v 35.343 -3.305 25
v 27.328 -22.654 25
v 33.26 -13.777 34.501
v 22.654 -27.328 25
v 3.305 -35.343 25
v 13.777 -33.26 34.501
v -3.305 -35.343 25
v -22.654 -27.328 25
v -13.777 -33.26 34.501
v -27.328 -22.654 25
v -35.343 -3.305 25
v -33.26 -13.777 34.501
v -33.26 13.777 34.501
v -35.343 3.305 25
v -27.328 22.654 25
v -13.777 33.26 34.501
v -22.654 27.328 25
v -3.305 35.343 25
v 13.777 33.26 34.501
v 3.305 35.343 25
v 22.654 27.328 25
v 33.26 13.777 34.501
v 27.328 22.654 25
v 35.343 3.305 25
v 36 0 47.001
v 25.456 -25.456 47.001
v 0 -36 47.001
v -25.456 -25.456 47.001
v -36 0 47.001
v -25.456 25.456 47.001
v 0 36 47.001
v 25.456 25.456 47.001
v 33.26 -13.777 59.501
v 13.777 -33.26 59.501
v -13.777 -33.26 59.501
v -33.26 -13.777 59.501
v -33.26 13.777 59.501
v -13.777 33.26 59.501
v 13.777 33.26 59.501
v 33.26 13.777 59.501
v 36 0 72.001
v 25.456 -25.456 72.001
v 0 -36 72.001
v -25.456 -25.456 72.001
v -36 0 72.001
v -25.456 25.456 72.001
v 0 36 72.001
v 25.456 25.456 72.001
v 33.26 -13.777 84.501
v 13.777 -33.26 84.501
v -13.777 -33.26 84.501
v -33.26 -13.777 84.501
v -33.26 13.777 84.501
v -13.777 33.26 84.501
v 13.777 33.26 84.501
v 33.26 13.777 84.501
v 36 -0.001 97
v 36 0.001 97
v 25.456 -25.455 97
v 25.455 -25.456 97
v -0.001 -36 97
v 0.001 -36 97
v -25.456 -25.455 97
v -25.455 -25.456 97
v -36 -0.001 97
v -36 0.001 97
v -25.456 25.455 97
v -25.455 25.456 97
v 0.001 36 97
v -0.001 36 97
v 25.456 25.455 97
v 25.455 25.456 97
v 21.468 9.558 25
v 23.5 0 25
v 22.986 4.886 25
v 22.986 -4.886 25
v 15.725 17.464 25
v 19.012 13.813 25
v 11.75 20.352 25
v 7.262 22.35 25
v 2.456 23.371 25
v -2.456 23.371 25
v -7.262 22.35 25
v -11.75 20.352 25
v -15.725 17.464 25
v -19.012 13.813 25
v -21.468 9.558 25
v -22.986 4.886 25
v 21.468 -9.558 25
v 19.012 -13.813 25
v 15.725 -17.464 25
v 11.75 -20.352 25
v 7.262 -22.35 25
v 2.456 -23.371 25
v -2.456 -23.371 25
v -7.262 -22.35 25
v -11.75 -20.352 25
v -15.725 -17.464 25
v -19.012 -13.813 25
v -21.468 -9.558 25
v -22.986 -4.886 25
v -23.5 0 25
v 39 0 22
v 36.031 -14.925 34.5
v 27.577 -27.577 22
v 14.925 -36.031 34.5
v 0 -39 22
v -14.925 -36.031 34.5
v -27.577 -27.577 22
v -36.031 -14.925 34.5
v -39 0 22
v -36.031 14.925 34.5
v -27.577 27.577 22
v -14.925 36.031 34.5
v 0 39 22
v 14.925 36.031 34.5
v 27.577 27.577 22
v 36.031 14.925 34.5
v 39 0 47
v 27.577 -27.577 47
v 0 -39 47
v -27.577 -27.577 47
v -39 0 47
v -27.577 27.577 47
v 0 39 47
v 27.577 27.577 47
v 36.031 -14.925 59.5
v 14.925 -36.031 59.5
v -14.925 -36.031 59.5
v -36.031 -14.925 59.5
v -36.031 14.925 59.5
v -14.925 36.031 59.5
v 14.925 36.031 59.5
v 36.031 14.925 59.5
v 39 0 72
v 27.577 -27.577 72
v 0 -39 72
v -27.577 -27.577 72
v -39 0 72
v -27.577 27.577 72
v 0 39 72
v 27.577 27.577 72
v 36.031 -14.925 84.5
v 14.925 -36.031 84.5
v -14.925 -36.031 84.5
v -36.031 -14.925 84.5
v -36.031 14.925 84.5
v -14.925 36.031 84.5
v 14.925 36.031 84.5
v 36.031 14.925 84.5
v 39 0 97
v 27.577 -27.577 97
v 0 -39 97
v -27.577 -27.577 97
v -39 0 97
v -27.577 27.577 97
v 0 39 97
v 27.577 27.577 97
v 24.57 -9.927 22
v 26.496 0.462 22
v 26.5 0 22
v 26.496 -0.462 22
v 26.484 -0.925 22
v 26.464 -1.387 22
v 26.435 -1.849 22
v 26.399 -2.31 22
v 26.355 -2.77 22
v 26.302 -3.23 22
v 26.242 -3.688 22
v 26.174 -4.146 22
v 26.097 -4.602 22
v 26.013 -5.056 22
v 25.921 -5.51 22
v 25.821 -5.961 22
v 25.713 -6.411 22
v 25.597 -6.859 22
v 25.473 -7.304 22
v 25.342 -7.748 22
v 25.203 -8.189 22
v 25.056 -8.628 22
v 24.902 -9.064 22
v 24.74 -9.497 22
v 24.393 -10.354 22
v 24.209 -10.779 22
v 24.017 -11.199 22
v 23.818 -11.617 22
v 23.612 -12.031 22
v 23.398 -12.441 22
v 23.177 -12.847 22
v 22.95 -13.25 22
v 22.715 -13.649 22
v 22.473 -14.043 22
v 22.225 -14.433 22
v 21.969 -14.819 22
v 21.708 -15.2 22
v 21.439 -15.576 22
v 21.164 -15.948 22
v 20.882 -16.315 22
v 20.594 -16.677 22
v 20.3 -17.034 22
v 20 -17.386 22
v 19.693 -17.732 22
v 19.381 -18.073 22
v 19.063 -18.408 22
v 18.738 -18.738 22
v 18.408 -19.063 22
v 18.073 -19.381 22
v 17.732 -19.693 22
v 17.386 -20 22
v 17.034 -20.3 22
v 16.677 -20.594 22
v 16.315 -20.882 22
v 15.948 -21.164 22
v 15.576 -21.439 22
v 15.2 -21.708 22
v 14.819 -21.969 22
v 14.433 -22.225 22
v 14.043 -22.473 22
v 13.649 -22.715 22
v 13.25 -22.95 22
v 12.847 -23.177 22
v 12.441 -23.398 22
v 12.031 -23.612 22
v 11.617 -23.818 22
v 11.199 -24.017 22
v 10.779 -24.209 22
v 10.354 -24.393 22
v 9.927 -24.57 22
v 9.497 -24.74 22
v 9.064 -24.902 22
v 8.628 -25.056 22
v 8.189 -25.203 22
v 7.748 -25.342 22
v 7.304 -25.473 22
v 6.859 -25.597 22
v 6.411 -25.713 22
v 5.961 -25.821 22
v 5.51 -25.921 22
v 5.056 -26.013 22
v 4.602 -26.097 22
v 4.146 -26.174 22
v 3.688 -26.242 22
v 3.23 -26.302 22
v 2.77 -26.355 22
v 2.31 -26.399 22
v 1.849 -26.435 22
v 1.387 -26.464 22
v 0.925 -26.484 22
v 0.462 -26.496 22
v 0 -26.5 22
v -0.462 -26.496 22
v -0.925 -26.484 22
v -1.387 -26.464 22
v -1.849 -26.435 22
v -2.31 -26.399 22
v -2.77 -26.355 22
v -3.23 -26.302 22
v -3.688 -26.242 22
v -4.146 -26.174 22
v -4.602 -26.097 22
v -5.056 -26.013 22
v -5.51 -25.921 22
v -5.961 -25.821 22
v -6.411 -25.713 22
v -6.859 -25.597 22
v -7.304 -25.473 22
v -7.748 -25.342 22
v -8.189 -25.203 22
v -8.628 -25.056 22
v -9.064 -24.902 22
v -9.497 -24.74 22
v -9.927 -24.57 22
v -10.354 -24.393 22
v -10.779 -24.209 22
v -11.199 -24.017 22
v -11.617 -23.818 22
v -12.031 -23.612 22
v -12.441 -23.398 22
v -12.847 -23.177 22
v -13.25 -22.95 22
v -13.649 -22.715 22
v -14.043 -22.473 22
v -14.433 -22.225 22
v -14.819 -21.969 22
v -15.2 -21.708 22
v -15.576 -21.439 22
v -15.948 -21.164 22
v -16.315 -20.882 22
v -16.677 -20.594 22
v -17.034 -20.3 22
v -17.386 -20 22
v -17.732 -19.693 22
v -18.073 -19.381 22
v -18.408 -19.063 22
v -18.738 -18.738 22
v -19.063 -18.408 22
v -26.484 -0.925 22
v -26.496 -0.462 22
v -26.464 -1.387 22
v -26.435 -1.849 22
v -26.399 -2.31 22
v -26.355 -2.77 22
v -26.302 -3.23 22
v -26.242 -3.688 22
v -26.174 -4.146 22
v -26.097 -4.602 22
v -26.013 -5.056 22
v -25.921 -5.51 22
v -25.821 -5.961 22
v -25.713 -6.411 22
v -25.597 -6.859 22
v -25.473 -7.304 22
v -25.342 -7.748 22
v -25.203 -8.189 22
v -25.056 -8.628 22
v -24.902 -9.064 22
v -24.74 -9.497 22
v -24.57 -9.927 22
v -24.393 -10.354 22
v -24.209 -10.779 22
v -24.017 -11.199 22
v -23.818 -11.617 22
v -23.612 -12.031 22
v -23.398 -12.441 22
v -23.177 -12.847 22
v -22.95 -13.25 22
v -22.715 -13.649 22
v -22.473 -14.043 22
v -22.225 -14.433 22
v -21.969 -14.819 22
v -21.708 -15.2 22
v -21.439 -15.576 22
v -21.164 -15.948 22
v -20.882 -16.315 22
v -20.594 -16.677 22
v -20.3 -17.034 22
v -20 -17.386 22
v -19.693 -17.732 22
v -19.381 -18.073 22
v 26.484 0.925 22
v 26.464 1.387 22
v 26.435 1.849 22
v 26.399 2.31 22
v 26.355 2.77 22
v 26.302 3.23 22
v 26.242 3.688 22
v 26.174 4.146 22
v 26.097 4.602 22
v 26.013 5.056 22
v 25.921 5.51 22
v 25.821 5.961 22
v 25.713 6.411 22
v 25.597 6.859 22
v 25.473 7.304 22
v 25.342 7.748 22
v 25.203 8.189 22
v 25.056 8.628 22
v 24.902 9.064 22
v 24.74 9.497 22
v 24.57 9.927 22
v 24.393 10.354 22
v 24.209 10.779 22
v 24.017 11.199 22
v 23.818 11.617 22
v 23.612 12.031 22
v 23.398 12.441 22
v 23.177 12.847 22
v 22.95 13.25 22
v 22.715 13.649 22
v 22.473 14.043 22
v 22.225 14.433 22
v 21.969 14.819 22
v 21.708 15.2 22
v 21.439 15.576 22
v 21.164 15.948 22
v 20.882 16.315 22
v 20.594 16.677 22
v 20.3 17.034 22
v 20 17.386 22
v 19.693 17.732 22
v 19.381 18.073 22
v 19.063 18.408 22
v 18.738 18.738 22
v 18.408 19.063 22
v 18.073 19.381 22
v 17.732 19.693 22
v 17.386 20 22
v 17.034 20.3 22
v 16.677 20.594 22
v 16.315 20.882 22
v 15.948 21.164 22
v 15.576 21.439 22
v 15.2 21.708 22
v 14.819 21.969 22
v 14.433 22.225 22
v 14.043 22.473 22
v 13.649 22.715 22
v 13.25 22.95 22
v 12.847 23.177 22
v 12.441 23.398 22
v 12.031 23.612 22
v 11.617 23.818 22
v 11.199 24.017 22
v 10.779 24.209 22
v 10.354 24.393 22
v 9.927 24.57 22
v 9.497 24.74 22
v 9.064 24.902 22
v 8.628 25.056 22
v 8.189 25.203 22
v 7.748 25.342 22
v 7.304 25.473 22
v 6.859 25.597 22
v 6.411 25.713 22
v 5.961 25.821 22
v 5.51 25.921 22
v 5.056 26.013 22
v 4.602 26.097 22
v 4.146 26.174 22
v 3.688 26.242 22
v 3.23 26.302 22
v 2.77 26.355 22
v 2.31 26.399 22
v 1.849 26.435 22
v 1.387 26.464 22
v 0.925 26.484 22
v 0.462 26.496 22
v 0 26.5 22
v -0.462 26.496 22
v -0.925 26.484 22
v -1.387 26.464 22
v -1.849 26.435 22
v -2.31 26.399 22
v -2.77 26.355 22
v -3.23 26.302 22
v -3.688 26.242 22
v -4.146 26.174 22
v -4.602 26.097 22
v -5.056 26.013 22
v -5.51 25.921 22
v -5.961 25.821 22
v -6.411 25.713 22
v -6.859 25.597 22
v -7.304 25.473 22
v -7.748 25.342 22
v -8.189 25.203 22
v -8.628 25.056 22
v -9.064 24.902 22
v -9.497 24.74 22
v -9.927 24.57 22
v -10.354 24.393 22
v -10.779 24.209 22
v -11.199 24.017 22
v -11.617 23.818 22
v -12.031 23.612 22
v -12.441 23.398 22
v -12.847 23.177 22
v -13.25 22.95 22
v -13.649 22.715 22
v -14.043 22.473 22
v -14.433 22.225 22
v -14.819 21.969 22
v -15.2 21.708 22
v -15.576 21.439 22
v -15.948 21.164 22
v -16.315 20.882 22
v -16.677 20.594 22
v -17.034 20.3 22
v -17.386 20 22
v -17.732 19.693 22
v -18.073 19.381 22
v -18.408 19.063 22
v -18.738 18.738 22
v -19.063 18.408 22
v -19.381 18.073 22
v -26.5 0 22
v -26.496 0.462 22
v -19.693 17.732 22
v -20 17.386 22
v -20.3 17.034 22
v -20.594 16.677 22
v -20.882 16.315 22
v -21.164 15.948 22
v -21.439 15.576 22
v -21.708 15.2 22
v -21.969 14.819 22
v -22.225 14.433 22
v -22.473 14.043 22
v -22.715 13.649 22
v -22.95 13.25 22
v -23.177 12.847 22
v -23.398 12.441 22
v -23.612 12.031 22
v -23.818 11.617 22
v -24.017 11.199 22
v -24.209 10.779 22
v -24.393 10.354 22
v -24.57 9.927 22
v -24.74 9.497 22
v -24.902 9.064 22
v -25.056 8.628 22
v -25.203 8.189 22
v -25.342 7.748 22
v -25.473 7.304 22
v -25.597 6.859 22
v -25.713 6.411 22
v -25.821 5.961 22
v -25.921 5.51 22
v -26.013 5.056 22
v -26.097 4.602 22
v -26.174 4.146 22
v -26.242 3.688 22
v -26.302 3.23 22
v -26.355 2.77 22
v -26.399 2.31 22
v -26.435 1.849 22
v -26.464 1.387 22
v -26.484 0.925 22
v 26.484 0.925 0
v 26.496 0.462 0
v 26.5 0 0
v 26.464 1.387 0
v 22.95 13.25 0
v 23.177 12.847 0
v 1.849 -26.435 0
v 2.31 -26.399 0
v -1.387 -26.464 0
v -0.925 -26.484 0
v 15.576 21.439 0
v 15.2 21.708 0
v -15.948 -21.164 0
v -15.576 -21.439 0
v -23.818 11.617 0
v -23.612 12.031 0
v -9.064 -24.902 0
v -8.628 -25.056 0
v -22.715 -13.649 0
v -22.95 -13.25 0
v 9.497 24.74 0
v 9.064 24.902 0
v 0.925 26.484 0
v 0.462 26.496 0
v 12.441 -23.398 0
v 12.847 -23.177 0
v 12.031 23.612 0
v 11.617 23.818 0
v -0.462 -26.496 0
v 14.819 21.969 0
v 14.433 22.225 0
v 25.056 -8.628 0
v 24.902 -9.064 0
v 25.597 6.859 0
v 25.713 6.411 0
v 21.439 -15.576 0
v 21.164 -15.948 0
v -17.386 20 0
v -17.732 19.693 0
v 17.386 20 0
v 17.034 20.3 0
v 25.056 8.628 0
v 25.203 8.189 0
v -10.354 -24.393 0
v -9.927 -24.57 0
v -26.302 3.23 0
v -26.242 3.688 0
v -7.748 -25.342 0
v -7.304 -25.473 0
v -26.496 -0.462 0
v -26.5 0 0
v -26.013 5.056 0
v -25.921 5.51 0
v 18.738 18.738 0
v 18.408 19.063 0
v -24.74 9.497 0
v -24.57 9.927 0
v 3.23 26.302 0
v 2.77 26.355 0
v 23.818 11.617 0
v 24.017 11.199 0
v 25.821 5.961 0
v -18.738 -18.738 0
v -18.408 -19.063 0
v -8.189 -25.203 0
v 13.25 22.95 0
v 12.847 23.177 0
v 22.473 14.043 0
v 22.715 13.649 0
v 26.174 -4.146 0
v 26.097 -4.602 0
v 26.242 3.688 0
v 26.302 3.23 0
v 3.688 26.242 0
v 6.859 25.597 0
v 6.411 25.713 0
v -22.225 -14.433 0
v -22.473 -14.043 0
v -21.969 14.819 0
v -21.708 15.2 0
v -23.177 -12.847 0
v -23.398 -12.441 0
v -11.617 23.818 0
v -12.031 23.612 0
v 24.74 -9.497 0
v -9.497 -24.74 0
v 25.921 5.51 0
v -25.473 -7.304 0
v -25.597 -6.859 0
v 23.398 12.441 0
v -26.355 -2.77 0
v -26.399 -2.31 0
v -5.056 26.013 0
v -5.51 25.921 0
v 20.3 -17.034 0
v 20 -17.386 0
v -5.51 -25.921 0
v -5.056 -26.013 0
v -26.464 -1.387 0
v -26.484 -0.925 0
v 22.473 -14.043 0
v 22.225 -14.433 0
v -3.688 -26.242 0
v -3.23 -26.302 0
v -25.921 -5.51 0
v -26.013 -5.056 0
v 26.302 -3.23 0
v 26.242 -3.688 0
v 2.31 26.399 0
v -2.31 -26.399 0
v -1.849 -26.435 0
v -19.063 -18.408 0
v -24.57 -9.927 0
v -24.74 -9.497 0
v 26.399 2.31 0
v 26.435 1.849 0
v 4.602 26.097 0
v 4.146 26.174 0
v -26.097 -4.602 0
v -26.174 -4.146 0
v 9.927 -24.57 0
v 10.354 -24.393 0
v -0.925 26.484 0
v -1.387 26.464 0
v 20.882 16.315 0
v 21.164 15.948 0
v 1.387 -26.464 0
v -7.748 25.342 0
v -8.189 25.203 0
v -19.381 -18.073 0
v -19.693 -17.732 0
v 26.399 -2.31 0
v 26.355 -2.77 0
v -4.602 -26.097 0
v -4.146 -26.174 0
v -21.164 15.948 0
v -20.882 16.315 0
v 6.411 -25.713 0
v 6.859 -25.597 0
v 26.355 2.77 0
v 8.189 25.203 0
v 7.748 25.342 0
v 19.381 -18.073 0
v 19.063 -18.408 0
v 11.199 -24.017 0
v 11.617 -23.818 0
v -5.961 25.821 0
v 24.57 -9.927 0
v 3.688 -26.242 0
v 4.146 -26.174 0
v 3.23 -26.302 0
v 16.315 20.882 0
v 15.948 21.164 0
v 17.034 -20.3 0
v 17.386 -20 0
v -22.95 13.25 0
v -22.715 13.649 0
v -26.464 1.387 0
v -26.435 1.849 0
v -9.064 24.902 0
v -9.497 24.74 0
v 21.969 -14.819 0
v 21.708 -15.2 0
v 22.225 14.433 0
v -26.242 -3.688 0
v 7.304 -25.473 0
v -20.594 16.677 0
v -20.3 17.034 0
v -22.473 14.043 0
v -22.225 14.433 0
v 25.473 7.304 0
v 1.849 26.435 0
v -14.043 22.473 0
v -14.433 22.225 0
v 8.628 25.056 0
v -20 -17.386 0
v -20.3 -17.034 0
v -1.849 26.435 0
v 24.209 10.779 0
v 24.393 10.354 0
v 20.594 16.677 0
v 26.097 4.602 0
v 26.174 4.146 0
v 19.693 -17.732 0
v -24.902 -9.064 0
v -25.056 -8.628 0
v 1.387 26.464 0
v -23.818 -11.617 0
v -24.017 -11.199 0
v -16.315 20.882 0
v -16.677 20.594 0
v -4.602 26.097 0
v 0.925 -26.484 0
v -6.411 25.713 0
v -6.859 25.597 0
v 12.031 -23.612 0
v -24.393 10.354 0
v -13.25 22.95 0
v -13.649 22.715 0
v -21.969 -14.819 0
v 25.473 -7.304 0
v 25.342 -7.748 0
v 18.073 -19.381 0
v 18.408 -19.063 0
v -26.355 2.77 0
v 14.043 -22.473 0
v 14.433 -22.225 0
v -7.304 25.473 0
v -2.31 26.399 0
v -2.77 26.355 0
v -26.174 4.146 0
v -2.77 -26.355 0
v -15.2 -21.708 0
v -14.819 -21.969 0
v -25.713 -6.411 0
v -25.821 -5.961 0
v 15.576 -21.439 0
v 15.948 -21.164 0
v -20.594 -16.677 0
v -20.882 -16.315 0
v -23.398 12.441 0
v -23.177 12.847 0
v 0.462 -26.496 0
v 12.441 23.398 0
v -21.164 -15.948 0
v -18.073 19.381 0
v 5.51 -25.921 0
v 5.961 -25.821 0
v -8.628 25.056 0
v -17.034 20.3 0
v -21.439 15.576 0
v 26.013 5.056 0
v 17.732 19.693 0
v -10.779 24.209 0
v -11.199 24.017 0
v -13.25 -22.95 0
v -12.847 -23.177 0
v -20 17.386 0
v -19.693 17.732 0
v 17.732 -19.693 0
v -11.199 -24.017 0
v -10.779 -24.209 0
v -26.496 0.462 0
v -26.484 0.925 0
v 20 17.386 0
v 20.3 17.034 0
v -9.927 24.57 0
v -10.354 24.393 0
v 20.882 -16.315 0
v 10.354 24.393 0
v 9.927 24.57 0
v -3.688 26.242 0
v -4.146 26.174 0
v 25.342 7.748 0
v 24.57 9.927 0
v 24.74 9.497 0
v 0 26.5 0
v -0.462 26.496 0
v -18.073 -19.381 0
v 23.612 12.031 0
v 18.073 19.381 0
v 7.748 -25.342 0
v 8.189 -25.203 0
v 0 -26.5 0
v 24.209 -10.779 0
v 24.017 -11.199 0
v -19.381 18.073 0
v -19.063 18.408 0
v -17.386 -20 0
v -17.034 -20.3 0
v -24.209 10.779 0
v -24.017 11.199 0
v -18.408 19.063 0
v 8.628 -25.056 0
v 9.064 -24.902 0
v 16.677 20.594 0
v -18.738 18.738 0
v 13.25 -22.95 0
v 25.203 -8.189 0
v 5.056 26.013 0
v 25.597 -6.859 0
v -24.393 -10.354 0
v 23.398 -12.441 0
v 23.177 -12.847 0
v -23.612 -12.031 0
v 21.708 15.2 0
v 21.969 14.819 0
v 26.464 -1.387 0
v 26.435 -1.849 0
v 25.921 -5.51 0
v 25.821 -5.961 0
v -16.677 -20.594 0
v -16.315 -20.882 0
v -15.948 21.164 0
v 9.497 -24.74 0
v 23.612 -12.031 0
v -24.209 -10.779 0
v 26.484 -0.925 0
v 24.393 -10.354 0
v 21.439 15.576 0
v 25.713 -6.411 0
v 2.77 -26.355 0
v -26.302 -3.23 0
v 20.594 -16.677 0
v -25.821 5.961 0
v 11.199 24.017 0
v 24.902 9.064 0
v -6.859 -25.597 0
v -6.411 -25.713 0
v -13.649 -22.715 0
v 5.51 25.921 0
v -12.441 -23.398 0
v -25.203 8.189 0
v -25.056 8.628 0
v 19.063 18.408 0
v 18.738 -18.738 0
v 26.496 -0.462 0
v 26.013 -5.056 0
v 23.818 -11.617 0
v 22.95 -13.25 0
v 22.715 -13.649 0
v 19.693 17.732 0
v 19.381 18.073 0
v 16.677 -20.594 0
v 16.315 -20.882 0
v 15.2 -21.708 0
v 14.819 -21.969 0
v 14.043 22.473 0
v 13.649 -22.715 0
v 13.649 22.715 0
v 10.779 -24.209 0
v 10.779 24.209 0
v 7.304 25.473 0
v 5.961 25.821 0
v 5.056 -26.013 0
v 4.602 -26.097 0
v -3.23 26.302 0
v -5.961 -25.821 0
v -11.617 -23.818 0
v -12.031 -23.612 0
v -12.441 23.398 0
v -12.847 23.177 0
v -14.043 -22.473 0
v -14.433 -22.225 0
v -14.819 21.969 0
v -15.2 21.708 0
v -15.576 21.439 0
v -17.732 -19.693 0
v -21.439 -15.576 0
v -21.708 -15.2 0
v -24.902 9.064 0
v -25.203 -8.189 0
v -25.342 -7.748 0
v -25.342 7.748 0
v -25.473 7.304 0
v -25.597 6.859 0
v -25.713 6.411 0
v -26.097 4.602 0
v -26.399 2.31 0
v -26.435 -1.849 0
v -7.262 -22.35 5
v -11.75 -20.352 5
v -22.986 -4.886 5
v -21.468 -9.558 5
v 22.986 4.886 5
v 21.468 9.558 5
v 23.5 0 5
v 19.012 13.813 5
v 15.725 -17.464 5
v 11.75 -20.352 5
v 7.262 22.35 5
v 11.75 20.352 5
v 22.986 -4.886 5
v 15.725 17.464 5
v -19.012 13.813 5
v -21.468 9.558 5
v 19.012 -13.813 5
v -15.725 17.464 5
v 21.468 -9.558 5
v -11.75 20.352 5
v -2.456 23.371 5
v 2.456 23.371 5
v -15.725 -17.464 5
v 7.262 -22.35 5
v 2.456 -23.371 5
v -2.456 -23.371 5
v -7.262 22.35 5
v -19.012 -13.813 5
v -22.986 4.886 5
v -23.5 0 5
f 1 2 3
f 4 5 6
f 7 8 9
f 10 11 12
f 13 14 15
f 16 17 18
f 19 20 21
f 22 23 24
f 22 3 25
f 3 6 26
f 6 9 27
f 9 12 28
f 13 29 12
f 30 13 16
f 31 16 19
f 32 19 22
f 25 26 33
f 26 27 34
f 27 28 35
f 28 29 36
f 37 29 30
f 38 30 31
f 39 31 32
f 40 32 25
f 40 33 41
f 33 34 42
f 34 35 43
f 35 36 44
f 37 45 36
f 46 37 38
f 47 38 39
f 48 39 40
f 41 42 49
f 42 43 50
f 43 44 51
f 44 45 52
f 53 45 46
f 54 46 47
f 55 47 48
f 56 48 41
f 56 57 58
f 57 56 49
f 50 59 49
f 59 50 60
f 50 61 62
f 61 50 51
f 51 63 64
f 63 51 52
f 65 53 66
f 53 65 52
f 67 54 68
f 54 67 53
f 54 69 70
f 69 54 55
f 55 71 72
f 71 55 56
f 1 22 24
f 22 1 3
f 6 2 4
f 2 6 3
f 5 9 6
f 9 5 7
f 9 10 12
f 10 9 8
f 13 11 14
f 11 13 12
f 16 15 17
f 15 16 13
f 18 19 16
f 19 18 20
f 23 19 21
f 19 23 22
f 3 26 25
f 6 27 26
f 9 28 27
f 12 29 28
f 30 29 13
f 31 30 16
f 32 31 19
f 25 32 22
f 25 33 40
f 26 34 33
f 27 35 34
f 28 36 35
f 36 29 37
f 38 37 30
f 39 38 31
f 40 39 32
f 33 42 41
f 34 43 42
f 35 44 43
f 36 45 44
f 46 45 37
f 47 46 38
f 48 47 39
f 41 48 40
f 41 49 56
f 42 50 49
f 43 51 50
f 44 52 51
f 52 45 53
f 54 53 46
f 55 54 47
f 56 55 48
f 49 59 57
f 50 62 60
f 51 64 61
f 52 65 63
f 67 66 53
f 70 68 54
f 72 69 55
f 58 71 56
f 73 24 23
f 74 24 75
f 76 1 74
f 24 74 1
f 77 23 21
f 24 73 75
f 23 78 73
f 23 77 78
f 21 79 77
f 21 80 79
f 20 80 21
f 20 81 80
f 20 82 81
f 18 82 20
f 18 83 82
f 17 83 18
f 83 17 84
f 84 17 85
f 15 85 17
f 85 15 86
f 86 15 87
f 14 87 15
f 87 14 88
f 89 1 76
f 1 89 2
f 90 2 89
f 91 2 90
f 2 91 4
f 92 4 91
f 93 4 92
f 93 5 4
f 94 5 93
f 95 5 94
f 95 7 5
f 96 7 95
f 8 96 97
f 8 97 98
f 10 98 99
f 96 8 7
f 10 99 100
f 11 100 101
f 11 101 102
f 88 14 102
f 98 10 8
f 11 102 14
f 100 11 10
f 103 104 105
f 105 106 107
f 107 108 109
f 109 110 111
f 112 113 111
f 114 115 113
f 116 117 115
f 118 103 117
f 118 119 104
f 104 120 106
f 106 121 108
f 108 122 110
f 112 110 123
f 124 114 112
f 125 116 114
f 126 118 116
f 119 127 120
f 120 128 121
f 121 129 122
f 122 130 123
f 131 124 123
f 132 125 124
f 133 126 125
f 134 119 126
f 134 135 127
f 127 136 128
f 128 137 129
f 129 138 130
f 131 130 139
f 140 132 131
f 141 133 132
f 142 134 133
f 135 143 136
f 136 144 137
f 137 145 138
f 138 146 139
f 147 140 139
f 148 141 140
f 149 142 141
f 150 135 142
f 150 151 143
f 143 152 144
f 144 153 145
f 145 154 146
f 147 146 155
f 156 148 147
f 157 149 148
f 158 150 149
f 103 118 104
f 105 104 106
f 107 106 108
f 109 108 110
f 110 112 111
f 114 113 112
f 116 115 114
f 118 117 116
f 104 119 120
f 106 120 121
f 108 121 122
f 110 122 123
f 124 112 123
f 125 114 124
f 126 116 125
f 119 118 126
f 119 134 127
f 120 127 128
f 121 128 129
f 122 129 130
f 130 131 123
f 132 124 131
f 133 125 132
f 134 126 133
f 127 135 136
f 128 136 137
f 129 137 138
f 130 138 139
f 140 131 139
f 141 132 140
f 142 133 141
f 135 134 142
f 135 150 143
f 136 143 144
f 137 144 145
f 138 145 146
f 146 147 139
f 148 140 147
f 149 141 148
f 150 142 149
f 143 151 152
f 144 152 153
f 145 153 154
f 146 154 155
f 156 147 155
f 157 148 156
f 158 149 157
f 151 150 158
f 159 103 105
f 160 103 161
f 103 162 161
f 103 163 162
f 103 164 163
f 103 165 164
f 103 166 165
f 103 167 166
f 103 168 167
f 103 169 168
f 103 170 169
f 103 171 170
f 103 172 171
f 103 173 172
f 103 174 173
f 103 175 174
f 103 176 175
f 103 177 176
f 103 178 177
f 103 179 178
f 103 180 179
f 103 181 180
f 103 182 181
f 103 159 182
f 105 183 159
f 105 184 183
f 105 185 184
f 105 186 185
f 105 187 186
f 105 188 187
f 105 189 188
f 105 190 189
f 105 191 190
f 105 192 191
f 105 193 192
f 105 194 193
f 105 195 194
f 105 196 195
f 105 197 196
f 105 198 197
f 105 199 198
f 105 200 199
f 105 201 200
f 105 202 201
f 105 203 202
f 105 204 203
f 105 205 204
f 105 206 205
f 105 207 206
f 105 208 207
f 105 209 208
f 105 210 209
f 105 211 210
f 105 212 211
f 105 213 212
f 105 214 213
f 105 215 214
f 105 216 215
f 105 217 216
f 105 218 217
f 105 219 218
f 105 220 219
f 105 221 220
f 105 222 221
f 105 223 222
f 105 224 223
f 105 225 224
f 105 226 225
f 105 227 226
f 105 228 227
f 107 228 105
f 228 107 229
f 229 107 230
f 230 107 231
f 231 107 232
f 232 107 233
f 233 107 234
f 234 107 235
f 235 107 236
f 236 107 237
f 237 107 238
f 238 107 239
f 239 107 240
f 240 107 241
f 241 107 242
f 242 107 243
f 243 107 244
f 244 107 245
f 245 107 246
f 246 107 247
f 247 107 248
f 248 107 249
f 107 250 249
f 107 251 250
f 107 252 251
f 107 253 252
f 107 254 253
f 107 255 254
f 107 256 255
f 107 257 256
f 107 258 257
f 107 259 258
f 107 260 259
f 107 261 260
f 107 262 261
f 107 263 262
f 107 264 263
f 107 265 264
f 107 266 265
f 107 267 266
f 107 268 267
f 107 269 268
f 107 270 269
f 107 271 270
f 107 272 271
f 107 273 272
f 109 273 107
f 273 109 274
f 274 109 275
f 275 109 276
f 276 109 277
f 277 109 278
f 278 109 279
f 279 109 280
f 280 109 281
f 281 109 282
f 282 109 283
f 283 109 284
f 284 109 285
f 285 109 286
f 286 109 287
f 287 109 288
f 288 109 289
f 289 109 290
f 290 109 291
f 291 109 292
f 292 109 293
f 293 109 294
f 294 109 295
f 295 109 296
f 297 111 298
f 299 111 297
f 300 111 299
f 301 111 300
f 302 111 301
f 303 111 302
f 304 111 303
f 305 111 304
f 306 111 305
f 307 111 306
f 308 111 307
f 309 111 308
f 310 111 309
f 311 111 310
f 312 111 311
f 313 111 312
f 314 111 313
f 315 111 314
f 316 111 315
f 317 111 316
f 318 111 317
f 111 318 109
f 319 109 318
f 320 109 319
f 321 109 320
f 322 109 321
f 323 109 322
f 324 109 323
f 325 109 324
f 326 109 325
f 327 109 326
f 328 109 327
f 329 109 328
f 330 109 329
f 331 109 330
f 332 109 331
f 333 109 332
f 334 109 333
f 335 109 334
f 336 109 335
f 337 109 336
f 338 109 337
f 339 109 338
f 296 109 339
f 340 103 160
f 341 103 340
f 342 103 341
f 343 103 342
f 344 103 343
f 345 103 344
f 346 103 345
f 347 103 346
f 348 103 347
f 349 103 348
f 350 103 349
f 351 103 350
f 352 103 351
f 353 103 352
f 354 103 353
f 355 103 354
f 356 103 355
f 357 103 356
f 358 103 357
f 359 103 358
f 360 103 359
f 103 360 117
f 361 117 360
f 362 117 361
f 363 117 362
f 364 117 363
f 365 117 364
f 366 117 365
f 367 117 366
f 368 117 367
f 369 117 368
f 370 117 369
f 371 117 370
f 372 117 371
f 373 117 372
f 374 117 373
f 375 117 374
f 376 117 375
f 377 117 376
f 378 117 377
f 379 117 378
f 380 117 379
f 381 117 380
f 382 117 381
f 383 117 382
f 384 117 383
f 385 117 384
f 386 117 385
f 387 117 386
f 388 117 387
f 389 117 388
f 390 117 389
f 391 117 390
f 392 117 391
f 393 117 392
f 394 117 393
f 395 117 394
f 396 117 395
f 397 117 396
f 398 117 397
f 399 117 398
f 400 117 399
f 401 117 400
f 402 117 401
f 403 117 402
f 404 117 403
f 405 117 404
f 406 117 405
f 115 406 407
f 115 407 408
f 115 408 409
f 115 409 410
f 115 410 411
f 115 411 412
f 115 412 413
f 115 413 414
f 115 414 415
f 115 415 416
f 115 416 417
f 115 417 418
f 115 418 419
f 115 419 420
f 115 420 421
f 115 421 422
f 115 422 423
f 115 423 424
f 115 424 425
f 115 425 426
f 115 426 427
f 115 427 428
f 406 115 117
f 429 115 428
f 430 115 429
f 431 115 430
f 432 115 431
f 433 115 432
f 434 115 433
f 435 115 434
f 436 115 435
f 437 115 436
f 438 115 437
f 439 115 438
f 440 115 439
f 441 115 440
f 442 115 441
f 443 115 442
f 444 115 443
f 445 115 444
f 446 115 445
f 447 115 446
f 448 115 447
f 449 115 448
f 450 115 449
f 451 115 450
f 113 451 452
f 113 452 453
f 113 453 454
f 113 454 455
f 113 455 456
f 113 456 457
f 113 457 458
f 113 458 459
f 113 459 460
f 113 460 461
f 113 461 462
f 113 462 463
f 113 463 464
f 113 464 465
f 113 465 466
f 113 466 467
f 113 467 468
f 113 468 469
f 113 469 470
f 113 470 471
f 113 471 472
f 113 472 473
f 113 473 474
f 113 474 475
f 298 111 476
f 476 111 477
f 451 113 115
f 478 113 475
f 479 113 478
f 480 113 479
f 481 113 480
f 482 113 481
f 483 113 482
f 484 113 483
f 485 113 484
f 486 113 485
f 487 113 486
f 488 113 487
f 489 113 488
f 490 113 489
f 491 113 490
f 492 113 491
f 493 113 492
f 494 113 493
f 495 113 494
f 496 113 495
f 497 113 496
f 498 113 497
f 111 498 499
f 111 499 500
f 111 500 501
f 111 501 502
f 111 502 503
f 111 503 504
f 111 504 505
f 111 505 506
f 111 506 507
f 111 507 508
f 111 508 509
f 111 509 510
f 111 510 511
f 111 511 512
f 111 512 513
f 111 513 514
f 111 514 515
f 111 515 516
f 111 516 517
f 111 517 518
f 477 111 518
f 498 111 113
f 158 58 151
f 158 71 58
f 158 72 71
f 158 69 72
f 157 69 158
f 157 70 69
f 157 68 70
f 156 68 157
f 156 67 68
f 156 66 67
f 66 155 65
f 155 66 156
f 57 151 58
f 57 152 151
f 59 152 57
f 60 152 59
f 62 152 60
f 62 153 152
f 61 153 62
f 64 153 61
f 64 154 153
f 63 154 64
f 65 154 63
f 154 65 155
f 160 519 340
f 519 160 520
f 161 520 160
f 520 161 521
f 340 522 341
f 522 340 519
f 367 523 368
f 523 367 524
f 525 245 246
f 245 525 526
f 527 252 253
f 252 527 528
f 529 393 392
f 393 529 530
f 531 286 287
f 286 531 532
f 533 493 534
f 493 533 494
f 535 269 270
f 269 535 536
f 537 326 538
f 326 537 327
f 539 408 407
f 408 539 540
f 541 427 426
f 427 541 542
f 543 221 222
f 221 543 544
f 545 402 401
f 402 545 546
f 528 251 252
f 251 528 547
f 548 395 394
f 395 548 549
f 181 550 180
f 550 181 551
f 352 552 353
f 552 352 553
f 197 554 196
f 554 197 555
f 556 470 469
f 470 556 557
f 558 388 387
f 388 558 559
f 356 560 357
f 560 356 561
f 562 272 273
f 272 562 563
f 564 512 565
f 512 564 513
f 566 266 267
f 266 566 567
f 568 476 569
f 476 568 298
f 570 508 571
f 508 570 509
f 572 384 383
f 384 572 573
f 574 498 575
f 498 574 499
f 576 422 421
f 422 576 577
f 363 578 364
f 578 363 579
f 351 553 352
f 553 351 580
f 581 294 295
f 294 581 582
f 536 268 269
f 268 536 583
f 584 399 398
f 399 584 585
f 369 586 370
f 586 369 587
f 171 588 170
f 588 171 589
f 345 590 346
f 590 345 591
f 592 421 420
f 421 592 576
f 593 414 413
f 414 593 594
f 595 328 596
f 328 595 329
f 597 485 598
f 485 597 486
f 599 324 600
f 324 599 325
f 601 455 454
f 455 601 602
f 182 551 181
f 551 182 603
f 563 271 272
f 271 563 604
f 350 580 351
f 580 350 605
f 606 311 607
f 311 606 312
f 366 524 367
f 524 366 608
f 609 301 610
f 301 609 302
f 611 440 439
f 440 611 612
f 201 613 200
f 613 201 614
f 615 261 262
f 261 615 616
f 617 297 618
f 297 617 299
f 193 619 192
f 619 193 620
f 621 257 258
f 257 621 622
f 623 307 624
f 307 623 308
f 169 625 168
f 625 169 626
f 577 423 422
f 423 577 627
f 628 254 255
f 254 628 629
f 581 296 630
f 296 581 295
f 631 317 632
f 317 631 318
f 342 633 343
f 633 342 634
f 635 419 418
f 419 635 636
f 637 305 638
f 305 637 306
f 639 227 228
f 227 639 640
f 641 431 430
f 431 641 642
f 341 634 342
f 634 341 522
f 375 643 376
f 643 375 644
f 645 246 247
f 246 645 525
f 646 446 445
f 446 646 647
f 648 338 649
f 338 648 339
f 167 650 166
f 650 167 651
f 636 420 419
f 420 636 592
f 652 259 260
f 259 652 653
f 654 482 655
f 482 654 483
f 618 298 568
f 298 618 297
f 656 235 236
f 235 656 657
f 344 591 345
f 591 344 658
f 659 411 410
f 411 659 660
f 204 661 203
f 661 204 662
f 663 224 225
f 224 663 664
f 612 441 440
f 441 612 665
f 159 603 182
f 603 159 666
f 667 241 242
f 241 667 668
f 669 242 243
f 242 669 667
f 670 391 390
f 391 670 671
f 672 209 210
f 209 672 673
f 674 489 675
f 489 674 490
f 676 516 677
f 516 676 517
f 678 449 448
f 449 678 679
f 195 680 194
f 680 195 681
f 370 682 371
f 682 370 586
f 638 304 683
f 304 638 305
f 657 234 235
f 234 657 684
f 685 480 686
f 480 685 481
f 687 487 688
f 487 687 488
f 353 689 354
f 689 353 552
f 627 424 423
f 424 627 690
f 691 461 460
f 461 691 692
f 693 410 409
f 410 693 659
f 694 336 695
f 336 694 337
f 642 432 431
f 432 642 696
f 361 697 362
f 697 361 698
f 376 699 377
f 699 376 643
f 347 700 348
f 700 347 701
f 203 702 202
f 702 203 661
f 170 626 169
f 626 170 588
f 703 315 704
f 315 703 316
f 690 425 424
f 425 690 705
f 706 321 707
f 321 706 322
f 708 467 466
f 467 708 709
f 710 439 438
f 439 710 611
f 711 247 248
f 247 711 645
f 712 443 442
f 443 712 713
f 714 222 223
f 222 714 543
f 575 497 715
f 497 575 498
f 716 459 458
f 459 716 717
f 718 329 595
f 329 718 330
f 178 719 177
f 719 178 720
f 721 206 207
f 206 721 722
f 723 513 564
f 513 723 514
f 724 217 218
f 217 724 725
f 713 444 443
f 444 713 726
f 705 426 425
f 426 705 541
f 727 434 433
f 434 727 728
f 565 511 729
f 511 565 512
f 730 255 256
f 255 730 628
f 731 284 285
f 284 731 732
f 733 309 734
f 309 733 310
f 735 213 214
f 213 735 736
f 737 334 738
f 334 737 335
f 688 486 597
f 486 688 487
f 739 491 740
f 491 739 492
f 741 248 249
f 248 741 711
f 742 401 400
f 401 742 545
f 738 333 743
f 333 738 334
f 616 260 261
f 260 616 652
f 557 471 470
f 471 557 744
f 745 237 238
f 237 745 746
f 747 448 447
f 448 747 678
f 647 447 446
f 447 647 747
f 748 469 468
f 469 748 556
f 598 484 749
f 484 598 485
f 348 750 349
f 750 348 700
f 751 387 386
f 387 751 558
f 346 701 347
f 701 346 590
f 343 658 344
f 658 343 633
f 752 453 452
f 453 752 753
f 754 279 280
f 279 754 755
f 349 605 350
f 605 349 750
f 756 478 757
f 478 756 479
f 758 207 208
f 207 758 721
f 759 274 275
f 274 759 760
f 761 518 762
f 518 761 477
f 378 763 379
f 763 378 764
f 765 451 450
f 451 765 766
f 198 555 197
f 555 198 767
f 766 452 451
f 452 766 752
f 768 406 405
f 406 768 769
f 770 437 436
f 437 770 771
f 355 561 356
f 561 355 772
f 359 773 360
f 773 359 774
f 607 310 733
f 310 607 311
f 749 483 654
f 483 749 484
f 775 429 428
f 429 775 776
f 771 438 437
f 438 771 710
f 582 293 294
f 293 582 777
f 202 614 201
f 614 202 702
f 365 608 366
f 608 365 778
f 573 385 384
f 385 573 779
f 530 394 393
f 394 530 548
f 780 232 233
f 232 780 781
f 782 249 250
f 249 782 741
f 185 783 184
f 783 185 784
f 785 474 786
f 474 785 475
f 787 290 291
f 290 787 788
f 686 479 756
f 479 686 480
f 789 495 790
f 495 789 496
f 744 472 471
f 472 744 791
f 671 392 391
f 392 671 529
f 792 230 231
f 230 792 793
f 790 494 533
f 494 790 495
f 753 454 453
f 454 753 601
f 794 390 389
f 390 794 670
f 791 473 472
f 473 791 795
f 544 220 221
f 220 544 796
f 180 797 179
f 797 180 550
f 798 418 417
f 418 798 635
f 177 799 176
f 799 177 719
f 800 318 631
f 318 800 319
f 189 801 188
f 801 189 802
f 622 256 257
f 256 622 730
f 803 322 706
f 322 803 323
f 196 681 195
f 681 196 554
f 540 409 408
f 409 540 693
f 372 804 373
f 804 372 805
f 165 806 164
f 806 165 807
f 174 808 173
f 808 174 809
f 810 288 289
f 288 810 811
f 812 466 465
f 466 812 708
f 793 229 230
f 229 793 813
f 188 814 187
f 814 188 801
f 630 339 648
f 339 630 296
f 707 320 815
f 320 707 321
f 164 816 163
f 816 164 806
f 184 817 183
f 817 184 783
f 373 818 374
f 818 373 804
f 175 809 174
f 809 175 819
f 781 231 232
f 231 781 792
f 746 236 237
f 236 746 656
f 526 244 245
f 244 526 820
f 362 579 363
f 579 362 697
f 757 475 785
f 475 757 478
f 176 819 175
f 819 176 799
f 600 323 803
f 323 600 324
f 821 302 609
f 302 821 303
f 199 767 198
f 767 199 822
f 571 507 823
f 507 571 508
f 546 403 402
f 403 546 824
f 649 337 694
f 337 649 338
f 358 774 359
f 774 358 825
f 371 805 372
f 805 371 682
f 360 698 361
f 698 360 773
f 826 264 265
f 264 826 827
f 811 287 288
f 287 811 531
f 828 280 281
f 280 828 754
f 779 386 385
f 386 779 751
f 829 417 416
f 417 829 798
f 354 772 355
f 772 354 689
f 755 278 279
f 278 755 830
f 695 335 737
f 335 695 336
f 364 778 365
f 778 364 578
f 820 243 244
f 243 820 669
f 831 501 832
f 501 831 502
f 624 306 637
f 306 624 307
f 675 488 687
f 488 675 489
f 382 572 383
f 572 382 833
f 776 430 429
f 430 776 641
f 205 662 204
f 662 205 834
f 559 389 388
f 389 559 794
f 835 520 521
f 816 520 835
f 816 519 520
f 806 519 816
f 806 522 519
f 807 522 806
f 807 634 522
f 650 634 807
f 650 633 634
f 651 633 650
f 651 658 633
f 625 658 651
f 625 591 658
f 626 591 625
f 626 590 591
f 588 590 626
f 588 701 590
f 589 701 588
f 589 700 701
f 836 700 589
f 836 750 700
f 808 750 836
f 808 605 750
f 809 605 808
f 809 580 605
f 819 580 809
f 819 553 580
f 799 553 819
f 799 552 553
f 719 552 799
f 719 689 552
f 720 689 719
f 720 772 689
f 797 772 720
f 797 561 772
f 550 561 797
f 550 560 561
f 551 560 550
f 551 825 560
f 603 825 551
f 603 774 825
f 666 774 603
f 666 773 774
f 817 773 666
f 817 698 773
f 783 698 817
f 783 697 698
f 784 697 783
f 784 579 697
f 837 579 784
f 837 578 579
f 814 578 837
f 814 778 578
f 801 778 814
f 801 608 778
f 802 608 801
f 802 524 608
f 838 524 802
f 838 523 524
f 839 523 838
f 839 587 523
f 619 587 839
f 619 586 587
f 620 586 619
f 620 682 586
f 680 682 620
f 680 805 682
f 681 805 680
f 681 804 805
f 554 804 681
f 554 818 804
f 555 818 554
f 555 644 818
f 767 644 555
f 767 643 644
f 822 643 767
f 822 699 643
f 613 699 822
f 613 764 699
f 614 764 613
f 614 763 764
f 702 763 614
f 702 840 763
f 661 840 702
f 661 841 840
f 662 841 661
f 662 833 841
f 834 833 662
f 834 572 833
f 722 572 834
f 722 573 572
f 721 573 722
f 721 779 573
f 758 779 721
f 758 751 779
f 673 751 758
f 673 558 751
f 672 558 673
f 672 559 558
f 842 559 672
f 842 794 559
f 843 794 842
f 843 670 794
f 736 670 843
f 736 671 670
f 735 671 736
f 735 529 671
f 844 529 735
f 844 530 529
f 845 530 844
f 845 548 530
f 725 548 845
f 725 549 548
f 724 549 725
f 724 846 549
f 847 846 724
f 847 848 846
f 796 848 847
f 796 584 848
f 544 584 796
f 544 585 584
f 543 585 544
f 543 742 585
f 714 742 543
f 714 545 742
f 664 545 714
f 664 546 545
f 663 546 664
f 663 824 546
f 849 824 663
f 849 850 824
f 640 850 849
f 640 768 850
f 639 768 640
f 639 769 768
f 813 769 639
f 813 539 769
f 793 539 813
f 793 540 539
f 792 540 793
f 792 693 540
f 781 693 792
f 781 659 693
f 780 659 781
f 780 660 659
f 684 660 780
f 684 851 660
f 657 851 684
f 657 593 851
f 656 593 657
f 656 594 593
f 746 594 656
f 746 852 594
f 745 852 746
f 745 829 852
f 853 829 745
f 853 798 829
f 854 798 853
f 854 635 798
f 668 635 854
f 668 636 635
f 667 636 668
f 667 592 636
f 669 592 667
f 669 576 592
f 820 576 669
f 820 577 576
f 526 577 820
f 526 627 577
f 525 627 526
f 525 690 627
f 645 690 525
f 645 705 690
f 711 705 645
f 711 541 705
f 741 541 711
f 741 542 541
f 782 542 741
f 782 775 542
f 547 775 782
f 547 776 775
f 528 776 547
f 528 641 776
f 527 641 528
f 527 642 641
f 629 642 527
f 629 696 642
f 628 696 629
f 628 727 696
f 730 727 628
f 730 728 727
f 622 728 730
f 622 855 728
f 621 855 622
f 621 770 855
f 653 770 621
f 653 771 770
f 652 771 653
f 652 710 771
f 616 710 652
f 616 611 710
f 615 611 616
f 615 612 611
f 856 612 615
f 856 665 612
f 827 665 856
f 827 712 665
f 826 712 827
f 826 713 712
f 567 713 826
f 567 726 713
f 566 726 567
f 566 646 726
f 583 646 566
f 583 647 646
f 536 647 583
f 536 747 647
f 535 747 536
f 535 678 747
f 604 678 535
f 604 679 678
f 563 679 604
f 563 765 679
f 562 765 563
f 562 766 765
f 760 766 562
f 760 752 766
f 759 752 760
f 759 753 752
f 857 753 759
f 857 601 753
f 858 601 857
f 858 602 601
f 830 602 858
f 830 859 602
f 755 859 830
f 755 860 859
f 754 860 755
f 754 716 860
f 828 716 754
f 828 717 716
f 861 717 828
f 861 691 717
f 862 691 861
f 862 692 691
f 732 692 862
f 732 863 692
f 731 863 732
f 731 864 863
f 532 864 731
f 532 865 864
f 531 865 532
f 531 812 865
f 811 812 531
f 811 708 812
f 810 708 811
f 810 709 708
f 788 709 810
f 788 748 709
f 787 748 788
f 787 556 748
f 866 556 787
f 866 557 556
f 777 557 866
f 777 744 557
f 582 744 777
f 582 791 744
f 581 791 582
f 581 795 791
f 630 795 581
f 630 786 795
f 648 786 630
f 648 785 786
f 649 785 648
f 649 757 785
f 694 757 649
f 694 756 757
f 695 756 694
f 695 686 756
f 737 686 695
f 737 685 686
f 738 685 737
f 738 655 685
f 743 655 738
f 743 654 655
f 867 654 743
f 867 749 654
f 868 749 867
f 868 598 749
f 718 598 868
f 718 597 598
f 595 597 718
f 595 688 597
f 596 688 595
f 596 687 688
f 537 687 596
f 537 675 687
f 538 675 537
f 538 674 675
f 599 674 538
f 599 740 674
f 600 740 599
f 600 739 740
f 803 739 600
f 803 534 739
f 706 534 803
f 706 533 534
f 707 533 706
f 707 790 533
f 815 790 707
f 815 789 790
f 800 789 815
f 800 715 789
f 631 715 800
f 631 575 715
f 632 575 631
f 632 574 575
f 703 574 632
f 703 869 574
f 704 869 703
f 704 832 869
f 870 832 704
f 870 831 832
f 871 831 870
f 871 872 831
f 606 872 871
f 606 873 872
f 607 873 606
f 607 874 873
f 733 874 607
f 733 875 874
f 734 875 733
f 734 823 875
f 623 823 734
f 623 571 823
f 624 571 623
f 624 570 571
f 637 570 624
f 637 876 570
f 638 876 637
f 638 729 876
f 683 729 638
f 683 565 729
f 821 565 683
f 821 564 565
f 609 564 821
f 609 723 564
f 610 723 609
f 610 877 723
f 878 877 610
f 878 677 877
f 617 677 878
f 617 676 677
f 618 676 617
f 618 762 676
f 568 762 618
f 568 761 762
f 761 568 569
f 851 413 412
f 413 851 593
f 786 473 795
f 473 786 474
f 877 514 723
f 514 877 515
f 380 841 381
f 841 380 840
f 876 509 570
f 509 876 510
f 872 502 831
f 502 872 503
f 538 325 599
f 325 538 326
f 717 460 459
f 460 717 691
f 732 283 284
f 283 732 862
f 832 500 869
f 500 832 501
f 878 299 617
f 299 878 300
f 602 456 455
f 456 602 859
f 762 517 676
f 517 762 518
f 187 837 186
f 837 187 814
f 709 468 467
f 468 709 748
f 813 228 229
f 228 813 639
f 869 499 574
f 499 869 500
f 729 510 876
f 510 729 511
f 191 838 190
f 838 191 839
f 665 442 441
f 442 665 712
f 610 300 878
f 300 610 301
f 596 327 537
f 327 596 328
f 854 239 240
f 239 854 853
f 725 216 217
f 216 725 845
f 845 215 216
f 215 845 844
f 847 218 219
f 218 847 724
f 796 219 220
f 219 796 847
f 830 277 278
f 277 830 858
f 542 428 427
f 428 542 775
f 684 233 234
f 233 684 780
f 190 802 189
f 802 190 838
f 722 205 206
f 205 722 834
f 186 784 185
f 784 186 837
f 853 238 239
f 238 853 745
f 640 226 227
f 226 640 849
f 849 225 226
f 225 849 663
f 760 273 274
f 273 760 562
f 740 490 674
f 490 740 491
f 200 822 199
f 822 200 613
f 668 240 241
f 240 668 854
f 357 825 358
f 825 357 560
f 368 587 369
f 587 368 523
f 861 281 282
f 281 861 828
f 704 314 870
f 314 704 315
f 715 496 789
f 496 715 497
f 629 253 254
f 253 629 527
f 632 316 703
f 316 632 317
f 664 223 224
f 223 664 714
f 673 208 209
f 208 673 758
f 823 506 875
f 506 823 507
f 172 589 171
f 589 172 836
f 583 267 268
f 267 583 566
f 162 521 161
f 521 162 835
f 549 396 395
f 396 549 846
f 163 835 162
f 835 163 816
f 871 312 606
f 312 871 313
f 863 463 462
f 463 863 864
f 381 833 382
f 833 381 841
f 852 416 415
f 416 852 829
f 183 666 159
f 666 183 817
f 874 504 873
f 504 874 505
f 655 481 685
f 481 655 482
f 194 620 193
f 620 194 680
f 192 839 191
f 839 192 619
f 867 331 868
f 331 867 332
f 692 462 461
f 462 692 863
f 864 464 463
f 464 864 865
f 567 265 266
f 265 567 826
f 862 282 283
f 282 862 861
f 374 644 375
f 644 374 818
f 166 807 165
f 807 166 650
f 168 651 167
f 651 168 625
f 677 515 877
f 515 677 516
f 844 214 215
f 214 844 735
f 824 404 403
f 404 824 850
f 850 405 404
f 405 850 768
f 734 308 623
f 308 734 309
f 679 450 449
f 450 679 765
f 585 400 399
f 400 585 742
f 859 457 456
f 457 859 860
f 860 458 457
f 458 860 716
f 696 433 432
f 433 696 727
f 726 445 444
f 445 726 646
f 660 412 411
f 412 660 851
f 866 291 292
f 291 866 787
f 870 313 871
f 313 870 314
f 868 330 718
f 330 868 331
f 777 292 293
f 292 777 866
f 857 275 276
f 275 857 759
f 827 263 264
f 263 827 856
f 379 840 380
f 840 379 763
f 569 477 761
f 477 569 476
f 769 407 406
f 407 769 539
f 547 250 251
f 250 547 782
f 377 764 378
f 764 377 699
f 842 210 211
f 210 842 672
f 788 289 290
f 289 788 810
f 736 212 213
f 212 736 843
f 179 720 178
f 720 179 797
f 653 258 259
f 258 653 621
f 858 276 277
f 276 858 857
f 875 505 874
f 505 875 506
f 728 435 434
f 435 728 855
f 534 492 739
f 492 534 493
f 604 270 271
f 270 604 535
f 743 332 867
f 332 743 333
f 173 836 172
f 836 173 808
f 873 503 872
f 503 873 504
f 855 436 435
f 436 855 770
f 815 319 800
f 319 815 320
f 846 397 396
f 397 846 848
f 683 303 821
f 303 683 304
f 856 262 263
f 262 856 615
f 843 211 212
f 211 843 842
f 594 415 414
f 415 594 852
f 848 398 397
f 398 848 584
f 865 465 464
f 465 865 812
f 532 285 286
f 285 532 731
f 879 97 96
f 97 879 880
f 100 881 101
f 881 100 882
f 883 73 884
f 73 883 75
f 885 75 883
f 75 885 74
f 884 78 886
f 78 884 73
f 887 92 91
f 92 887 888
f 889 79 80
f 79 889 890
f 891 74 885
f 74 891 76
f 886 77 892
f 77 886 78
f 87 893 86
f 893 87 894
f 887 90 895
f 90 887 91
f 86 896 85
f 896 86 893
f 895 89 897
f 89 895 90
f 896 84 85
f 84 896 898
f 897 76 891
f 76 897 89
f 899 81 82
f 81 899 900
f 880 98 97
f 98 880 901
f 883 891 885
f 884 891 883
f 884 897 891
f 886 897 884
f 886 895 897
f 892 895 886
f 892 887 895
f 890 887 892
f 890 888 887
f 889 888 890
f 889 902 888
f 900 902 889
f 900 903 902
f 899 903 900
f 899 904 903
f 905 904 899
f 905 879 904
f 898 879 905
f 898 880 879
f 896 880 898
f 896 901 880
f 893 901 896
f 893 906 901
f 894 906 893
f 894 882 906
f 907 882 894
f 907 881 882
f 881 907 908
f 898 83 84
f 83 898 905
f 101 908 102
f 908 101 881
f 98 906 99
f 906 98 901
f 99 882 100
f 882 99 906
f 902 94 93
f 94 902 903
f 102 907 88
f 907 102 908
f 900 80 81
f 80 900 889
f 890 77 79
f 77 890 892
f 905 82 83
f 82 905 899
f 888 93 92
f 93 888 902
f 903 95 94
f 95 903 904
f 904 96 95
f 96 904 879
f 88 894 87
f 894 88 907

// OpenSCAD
/* [Top Part Dimensions] */
// height
top_height = 75;
// radius
top_radius = 39;
// number of edges
top_edges = 8;
// number of floors
top_levels = 6;

/* [Bottom Part Dimensions] */
// height
bottom_height = 22;
// radius
bottom_radius = 26.5;
//thickness of the
bottom_thickness = 5;

/* [Wall Dimensions] */
// thickness
wall_thickness = 3;

difference() {
  union() {
    translate([0, 0, bottom_height]) {
      top();
    }
    translate([0,0,bottom_height/2])
      cylinder(r=bottom_radius, h=bottom_height, center=true, $fn=360);
  }
  translate([0, 0, bottom_height+bottom_thickness]) {
    cylinder(r=bottom_radius-wall_thickness, h=bottom_height*2, center=true);
  }
}


module top() {
  faceshilfsarray=[for(i=[0:(top_edges-1)]) i];
  faces1=[
  for (i=[0:(top_levels-1)])
  for (ii=[0:top_edges-1])
  [faceshilfsarray[ii%top_edges]+(i)*top_edges,
  faceshilfsarray[(ii+1)%top_edges]+(i)*top_edges,
  (i+1)*top_edges+faceshilfsarray[(ii%top_edges+((i+1)%2))%top_edges]]
  ];
  faces2=[
  for (i=[0:(top_levels-1)])
  for (ii=[0:top_edges-1])
  [faceshilfsarray[(ii+1)%top_edges]+(i+1)*top_edges,
  faceshilfsarray[ii%top_edges]+(i+1)*top_edges,
  (i)*top_edges+faceshilfsarray[(ii%top_edges+((i)%2))%top_edges]]
  ];
  face_bottom=[for(i=[(top_edges-1):-1:0]) i];
  face_top=[for(i=[top_levels*top_edges:(top_levels+1)*top_edges]) i];

  faces=concat(faces1,faces2,[face_bottom],[face_top]);

  coords=[for(ii=[0:top_levels]) for (i=[1:top_edges]) [top_radius*sin((1-(ii%2)*0.5)*360/top_edges+i*360/top_edges),top_radius*cos((1-(ii%2)*0.5)*360/top_edges+i*360/top_edges),top_height/top_levels*ii]];

  difference() {
    scale([1, 1, 1]) {
      polyhedron(coords,faces,convexity=5);
    }
    difference(){
      translate([0,0,0.001])
      {
        scale([(top_radius-wall_thickness)/top_radius, (top_radius-wall_thickness)/top_radius, 1]) {
          polyhedron(coords,faces,convexity=5);
        }
      }
      translate([0,0,wall_thickness/2])
      {
        cube(size=[top_radius*2, top_radius*2, wall_thickness], center=true);
      }
    }
  }
}
